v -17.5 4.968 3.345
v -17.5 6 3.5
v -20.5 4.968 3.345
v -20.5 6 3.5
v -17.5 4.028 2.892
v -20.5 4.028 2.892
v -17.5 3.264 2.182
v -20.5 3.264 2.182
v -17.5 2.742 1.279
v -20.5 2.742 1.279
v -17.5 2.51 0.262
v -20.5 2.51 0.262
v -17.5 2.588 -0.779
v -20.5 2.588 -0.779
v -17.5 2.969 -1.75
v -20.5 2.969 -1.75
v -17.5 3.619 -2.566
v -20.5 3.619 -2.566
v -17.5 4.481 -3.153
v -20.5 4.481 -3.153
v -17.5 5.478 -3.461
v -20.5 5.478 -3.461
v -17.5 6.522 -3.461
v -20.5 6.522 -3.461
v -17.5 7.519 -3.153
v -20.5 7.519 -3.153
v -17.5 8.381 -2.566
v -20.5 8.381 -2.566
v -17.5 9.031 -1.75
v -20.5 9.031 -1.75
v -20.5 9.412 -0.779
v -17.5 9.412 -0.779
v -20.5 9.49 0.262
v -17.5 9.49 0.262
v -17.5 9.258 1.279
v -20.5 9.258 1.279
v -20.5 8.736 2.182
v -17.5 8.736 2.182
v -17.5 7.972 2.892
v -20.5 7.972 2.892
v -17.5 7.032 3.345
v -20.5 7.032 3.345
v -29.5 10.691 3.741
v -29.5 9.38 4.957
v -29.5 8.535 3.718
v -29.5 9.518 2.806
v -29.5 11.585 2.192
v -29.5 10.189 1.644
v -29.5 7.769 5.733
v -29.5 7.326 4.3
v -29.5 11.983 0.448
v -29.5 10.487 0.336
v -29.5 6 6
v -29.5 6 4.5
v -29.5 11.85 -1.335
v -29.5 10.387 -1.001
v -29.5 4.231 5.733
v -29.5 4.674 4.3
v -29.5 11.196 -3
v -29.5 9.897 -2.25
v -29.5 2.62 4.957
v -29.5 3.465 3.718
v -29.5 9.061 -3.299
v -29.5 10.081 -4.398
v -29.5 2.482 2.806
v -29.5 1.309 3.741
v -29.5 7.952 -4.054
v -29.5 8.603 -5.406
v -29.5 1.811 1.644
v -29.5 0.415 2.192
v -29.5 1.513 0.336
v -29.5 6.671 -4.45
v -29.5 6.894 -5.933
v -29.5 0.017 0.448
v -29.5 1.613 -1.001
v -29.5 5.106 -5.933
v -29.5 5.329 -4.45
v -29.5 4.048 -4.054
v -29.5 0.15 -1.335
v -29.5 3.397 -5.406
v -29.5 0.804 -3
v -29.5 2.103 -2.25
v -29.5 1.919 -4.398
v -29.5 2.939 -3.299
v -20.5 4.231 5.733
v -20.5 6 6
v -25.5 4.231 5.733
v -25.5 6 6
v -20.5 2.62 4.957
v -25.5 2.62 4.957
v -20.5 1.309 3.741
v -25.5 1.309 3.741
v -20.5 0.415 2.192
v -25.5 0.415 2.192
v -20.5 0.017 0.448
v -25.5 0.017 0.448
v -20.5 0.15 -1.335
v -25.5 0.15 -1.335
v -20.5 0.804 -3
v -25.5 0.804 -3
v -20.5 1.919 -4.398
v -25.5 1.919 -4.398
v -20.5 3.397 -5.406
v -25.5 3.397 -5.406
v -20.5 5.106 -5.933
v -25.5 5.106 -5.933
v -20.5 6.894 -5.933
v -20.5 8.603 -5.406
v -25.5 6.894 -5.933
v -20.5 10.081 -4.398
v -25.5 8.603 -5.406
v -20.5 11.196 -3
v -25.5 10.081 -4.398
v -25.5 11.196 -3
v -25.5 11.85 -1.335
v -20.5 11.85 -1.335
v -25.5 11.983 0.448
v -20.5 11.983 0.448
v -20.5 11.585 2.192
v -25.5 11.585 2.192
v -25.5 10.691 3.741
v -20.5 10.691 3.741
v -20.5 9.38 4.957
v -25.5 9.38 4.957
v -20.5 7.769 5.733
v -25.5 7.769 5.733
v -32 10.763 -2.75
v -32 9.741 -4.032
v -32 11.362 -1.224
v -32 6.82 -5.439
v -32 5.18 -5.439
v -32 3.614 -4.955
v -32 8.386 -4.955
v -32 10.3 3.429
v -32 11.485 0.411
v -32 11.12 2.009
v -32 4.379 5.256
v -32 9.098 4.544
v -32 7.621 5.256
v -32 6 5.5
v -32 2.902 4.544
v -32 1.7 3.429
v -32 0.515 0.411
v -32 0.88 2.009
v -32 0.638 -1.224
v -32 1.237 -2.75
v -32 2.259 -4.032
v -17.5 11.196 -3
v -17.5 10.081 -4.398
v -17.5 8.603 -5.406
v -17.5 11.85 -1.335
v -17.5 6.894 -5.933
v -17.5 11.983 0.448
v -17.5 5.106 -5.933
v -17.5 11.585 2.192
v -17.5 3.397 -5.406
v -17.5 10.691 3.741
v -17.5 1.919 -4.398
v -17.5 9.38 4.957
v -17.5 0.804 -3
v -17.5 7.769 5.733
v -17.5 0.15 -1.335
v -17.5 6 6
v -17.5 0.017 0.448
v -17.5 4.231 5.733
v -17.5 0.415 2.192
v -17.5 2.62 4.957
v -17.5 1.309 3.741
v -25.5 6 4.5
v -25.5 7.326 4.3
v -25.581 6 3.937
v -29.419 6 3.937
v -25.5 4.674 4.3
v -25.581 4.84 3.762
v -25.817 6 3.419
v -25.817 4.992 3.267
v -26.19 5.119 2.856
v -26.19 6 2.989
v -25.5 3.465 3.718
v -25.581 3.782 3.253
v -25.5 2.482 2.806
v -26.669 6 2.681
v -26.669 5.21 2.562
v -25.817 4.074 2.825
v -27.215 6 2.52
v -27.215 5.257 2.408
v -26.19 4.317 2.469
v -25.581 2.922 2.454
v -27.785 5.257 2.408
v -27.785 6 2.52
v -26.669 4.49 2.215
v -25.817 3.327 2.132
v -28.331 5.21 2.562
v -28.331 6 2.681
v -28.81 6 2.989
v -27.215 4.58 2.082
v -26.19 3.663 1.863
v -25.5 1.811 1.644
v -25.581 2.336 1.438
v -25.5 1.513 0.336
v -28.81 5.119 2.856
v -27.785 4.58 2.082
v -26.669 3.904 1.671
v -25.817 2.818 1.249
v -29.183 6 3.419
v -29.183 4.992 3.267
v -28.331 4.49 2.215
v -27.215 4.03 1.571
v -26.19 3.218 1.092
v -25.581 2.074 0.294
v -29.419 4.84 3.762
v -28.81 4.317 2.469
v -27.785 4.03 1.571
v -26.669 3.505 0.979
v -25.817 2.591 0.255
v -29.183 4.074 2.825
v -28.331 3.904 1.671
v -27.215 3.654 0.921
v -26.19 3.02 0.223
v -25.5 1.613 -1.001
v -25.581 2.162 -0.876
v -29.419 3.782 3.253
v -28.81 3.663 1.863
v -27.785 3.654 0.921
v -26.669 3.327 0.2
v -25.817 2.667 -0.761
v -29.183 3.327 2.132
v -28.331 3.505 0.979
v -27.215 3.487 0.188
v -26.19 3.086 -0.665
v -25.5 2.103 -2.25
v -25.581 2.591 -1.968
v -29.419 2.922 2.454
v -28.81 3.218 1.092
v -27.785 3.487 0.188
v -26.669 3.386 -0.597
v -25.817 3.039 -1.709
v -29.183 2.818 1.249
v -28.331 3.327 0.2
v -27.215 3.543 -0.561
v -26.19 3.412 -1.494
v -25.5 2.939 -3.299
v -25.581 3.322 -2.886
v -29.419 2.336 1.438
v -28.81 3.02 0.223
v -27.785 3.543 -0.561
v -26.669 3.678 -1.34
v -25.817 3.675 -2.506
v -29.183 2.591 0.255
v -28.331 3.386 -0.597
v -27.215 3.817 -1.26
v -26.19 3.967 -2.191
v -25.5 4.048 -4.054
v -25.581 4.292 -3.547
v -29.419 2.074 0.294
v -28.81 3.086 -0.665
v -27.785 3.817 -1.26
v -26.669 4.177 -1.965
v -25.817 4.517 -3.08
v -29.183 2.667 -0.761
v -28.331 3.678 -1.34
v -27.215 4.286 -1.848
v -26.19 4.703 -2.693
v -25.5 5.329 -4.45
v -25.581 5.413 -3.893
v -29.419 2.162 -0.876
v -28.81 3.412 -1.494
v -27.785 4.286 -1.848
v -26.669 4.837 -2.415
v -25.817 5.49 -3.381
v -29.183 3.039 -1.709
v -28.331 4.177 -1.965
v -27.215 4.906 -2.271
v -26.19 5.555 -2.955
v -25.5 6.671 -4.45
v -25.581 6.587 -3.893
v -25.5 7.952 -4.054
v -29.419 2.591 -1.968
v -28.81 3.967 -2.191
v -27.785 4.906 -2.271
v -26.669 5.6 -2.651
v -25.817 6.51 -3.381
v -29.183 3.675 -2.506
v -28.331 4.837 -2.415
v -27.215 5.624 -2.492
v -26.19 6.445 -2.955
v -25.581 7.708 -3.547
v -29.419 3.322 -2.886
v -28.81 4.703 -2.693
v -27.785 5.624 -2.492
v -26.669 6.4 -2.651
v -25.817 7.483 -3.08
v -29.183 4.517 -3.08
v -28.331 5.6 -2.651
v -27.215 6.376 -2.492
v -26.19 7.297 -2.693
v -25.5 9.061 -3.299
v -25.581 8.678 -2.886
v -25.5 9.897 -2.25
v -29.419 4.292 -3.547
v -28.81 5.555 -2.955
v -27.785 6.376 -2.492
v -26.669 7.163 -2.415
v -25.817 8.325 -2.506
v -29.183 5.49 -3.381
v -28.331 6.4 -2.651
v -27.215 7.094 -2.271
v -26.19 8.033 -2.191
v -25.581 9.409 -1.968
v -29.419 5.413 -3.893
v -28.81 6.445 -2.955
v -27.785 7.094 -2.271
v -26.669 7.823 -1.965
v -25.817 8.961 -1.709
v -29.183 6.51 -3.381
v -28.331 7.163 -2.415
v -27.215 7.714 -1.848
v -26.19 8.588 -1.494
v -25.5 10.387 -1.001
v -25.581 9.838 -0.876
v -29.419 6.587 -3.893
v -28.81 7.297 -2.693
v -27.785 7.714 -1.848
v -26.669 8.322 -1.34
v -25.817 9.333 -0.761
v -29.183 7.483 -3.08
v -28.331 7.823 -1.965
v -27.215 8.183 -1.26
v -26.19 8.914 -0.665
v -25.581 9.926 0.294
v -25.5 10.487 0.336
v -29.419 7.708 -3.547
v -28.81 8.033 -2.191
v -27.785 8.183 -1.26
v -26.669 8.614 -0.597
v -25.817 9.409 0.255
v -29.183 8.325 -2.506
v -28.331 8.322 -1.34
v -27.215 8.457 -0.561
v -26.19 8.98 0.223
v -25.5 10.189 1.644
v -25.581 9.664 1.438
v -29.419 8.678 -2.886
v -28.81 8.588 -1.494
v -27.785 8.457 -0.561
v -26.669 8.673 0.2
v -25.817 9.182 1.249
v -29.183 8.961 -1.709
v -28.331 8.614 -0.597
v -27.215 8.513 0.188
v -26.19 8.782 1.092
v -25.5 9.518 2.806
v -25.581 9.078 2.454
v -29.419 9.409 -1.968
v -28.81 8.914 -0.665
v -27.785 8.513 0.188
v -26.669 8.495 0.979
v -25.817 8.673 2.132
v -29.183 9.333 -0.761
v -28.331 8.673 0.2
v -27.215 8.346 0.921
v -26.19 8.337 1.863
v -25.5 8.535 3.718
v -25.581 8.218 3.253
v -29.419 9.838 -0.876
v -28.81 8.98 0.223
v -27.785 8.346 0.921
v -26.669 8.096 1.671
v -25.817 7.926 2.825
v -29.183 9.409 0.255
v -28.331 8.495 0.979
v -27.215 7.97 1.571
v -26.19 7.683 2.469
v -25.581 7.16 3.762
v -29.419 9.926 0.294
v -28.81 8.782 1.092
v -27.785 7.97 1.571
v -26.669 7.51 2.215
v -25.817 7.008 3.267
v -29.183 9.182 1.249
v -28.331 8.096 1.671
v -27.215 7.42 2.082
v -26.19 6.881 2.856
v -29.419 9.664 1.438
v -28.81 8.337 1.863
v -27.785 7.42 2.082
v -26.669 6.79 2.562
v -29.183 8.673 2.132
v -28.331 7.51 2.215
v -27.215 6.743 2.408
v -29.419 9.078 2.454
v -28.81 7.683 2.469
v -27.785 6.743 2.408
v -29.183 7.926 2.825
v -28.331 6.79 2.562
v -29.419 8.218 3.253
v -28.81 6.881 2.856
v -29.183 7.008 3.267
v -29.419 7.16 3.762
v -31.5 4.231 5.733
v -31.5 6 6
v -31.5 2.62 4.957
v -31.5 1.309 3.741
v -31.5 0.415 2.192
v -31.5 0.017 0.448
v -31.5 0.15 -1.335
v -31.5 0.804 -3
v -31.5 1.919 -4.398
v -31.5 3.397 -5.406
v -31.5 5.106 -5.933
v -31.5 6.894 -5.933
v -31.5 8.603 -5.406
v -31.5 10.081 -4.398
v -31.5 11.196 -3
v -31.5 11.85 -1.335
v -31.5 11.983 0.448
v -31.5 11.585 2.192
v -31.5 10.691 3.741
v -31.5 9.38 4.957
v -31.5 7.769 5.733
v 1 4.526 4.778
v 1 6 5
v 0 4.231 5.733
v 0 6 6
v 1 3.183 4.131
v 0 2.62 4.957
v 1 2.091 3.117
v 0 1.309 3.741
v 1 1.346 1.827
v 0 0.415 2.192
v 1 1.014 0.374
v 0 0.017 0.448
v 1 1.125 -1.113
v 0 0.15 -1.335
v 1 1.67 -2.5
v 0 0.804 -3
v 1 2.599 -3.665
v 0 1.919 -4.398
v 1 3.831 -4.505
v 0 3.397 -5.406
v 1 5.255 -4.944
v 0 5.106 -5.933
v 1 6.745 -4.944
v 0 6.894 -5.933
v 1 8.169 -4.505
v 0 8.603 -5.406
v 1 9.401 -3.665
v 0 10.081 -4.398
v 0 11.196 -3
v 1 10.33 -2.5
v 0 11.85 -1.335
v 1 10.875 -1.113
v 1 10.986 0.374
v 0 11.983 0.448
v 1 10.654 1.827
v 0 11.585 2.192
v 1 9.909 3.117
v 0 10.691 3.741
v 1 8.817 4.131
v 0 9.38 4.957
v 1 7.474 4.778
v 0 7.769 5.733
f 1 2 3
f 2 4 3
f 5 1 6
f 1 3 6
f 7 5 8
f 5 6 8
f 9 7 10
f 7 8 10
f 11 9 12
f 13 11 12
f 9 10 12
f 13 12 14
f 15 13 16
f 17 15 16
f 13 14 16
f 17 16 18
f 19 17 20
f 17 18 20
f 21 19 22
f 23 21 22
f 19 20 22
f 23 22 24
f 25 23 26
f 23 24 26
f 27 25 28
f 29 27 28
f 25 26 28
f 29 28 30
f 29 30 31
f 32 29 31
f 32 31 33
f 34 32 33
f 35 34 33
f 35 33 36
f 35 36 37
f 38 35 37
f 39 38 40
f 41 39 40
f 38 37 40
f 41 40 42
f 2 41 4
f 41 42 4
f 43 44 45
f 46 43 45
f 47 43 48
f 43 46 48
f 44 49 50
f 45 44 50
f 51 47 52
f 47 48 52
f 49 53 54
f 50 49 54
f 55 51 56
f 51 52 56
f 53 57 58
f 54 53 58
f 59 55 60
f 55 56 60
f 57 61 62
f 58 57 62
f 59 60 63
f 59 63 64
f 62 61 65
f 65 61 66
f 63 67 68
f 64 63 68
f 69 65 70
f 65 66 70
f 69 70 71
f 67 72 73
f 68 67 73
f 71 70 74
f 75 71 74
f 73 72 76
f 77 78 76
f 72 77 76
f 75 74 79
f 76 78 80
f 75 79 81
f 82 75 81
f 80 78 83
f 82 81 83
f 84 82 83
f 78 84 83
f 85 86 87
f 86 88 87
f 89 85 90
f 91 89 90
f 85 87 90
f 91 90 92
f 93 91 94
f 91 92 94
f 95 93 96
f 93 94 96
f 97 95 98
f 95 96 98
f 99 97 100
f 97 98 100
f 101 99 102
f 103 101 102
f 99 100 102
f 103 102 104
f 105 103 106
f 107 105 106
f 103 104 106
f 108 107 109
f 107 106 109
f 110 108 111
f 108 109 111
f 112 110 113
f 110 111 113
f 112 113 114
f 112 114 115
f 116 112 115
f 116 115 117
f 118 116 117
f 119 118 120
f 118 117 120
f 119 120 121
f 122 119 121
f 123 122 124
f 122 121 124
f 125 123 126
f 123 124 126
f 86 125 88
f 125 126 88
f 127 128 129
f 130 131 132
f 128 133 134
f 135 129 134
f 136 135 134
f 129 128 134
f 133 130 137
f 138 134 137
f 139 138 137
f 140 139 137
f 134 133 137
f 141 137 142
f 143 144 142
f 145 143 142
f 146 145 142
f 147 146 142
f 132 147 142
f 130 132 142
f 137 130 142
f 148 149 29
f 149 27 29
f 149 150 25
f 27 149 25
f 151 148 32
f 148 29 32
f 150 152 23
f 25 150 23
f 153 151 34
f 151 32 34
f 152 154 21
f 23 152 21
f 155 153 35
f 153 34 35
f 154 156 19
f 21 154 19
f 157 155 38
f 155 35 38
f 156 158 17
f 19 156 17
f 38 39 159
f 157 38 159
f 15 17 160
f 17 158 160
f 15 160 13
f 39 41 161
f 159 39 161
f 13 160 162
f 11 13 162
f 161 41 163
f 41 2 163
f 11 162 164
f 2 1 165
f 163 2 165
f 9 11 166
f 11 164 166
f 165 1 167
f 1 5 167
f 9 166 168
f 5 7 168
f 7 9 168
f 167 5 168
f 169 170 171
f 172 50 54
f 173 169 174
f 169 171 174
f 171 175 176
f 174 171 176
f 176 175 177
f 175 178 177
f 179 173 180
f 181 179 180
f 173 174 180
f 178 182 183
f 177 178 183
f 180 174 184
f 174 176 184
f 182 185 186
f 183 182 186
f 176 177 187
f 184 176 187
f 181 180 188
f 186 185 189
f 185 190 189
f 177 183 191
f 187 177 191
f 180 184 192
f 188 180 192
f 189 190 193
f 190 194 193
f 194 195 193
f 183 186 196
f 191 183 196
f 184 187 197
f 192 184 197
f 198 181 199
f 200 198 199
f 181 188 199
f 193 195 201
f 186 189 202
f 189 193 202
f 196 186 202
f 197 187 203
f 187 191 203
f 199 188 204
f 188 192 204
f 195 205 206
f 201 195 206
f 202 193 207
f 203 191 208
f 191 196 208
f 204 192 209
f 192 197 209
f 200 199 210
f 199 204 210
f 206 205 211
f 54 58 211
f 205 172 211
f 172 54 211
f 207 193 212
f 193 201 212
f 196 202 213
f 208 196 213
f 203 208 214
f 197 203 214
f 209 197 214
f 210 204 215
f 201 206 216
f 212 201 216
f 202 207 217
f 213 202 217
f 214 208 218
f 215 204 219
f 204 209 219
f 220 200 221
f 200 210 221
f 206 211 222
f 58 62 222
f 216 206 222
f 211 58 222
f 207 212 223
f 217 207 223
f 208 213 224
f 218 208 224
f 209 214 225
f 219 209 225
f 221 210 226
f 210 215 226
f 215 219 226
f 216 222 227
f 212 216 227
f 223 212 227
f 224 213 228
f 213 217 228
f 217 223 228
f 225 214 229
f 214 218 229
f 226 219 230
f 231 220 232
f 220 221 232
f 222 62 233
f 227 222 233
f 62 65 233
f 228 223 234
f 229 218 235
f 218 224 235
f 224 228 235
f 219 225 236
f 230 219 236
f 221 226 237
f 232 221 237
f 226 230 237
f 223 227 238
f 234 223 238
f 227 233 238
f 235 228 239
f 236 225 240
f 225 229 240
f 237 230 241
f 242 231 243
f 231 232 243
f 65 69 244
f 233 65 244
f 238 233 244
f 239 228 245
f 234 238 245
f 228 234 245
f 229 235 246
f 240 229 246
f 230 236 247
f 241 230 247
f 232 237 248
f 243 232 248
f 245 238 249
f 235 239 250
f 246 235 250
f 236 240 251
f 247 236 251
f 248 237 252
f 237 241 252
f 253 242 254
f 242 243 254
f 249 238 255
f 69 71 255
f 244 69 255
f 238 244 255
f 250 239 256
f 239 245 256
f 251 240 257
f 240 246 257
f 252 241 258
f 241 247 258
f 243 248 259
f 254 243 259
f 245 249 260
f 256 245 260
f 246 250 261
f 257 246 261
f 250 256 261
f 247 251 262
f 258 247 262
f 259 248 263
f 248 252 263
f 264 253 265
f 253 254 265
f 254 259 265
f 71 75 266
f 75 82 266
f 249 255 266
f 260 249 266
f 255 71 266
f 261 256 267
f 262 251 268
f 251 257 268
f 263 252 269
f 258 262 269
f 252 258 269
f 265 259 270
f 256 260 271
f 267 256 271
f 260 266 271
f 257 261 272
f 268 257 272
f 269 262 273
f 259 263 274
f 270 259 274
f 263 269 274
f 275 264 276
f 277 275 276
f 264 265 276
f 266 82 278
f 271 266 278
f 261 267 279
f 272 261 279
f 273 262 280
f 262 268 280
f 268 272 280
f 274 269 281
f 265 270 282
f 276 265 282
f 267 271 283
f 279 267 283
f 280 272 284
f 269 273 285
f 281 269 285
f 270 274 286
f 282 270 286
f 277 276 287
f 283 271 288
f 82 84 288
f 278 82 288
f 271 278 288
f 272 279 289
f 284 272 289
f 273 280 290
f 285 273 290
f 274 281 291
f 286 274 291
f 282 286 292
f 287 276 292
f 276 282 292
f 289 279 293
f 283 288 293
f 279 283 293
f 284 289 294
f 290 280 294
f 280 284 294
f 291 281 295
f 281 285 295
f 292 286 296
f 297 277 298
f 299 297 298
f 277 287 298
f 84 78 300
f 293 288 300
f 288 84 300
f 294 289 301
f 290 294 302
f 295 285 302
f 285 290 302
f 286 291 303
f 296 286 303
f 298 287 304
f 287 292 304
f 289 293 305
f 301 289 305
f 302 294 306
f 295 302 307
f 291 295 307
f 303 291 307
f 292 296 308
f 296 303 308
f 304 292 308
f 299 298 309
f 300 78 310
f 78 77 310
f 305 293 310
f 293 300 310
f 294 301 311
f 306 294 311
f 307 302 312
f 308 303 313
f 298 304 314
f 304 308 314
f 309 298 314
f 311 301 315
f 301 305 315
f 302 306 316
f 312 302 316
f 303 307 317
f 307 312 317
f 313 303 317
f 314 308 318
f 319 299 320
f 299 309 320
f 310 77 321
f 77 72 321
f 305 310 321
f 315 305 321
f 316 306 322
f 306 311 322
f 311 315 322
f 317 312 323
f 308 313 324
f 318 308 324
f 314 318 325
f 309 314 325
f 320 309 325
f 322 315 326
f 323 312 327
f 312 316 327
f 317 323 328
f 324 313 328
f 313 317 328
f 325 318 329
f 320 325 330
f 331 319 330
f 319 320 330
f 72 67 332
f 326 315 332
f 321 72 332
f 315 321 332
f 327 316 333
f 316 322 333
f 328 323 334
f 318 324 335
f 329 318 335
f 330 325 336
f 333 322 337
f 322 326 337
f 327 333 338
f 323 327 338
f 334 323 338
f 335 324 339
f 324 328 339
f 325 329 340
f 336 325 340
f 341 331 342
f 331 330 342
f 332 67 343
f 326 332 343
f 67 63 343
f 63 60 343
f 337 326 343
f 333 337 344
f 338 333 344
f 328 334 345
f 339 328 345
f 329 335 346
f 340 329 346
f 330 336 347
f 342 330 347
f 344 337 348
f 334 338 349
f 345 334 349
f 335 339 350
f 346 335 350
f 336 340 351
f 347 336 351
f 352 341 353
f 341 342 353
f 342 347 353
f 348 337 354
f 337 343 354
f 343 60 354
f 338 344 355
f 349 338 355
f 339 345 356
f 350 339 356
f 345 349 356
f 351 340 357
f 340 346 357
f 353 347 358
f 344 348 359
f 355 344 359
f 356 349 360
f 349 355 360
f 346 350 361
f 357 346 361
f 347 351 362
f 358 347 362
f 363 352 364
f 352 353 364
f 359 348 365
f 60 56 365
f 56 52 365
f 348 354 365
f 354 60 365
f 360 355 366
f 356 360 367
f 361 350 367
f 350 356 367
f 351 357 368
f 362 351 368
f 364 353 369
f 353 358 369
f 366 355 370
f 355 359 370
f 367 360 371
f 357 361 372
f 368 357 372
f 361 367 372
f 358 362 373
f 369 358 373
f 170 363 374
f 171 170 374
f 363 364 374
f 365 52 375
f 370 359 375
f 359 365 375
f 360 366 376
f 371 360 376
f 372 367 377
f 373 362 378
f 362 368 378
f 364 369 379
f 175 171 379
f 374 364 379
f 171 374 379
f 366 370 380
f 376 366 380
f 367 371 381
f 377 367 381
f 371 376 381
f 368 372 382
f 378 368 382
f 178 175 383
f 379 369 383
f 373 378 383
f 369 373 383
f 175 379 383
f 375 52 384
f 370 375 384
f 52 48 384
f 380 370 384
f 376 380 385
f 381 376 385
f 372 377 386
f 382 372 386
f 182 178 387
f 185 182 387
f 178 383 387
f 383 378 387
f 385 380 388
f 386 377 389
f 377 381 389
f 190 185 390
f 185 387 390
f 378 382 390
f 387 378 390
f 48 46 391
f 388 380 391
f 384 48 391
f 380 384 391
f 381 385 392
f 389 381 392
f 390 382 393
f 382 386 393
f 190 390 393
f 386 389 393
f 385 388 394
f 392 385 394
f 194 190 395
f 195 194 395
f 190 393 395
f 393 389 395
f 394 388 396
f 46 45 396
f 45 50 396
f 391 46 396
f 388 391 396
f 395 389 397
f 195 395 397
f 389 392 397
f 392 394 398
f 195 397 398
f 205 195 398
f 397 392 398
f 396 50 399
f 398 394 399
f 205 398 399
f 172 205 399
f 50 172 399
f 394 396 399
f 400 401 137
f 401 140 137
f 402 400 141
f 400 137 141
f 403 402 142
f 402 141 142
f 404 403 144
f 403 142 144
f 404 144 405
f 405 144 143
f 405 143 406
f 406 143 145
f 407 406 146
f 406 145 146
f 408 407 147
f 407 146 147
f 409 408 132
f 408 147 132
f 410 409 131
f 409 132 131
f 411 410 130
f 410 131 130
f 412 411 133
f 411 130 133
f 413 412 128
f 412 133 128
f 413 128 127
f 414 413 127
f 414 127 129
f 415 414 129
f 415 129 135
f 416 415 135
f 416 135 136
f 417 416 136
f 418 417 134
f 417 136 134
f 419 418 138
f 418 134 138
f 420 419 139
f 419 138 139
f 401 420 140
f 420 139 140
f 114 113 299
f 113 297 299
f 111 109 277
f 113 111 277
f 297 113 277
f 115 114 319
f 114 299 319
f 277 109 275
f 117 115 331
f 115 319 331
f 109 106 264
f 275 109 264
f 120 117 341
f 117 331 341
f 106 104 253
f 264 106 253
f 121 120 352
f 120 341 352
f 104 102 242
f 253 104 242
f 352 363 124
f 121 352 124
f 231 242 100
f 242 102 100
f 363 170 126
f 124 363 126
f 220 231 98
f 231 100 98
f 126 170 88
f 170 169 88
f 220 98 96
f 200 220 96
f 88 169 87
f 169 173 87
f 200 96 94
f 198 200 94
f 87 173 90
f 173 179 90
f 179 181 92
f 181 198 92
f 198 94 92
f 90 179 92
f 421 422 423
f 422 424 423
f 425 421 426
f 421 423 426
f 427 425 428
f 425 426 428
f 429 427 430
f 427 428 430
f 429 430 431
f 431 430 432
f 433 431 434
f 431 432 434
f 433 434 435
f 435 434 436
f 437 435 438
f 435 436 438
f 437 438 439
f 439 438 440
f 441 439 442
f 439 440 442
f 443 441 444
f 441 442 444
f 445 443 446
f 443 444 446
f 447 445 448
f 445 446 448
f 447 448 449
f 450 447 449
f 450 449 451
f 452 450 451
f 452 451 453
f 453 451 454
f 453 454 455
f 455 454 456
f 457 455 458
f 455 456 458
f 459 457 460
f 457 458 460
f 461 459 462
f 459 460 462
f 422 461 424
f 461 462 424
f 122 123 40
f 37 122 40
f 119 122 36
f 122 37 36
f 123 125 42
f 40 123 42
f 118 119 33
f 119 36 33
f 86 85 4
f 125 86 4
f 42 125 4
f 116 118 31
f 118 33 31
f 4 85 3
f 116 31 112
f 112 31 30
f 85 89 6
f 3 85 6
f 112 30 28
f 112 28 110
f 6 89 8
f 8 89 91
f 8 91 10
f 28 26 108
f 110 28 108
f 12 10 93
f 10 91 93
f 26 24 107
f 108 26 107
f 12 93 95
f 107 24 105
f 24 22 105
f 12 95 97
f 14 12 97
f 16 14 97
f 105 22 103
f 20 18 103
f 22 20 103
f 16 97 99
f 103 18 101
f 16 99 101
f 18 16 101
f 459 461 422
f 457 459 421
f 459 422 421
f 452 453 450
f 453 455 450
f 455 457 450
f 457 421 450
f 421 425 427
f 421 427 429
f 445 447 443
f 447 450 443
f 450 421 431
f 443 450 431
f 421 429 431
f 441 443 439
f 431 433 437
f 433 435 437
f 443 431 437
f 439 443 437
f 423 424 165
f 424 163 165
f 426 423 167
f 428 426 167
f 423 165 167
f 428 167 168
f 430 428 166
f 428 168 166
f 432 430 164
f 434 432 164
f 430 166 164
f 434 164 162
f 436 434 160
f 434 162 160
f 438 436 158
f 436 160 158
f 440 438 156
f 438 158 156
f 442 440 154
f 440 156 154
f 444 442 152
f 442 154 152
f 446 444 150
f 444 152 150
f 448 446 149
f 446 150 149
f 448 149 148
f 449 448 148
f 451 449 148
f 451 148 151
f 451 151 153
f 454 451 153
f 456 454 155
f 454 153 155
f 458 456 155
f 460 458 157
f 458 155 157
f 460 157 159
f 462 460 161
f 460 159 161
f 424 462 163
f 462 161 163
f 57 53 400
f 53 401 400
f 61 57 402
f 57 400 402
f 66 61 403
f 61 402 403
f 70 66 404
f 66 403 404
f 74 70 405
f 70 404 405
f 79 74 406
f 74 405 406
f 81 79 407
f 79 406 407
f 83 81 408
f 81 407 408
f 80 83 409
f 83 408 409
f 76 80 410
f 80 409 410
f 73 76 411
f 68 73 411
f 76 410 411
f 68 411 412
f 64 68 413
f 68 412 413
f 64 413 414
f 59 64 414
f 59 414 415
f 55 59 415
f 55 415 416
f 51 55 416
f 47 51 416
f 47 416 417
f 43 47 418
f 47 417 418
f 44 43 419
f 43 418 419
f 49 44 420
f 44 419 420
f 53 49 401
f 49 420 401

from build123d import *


with BuildPart() as part:
    # Esquisse1 → Révolution2 (revolve)
    with BuildSketch(Plane.XY, mode=Mode.PRIVATE) as r_volution2_sk:
        with BuildLine():
            Line((0, 0), (-17.5, 0))
            Line((-17.5, 0), (-17.5, 2.5))
            Line((-17.5, 2.5), (-20.5, 2.5))
            Line((-20.5, 2.5), (-20.5, 0))
            Line((-20.5, 0), (-25.5, 0))
            Line((-25.5, 0), (-25.5, 1.5))
            ThreePointArc((-25.5, 1.5), (-27.5, 3.5), (-29.5, 1.5))
            Line((-29.5, 1.5), (-29.5, 0))
            Line((-29.5, 0), (-31.5, 0))
            Line((-31.5, 0), (-32, 0.5))
            Line((-32, 0.5), (-32, 6))
            Line((-32, 6), (1, 6))
            Line((1, 6), (1, 1))
            Line((1, 1), (0, 0))
        make_face()
    revolve(r_volution2_sk.sketch.rotate(Axis((-32, 6, 0), (1, 0, 0)), 270), axis=Axis((-32, 6, 0), (1, 0, 0)))


solid = part.part
